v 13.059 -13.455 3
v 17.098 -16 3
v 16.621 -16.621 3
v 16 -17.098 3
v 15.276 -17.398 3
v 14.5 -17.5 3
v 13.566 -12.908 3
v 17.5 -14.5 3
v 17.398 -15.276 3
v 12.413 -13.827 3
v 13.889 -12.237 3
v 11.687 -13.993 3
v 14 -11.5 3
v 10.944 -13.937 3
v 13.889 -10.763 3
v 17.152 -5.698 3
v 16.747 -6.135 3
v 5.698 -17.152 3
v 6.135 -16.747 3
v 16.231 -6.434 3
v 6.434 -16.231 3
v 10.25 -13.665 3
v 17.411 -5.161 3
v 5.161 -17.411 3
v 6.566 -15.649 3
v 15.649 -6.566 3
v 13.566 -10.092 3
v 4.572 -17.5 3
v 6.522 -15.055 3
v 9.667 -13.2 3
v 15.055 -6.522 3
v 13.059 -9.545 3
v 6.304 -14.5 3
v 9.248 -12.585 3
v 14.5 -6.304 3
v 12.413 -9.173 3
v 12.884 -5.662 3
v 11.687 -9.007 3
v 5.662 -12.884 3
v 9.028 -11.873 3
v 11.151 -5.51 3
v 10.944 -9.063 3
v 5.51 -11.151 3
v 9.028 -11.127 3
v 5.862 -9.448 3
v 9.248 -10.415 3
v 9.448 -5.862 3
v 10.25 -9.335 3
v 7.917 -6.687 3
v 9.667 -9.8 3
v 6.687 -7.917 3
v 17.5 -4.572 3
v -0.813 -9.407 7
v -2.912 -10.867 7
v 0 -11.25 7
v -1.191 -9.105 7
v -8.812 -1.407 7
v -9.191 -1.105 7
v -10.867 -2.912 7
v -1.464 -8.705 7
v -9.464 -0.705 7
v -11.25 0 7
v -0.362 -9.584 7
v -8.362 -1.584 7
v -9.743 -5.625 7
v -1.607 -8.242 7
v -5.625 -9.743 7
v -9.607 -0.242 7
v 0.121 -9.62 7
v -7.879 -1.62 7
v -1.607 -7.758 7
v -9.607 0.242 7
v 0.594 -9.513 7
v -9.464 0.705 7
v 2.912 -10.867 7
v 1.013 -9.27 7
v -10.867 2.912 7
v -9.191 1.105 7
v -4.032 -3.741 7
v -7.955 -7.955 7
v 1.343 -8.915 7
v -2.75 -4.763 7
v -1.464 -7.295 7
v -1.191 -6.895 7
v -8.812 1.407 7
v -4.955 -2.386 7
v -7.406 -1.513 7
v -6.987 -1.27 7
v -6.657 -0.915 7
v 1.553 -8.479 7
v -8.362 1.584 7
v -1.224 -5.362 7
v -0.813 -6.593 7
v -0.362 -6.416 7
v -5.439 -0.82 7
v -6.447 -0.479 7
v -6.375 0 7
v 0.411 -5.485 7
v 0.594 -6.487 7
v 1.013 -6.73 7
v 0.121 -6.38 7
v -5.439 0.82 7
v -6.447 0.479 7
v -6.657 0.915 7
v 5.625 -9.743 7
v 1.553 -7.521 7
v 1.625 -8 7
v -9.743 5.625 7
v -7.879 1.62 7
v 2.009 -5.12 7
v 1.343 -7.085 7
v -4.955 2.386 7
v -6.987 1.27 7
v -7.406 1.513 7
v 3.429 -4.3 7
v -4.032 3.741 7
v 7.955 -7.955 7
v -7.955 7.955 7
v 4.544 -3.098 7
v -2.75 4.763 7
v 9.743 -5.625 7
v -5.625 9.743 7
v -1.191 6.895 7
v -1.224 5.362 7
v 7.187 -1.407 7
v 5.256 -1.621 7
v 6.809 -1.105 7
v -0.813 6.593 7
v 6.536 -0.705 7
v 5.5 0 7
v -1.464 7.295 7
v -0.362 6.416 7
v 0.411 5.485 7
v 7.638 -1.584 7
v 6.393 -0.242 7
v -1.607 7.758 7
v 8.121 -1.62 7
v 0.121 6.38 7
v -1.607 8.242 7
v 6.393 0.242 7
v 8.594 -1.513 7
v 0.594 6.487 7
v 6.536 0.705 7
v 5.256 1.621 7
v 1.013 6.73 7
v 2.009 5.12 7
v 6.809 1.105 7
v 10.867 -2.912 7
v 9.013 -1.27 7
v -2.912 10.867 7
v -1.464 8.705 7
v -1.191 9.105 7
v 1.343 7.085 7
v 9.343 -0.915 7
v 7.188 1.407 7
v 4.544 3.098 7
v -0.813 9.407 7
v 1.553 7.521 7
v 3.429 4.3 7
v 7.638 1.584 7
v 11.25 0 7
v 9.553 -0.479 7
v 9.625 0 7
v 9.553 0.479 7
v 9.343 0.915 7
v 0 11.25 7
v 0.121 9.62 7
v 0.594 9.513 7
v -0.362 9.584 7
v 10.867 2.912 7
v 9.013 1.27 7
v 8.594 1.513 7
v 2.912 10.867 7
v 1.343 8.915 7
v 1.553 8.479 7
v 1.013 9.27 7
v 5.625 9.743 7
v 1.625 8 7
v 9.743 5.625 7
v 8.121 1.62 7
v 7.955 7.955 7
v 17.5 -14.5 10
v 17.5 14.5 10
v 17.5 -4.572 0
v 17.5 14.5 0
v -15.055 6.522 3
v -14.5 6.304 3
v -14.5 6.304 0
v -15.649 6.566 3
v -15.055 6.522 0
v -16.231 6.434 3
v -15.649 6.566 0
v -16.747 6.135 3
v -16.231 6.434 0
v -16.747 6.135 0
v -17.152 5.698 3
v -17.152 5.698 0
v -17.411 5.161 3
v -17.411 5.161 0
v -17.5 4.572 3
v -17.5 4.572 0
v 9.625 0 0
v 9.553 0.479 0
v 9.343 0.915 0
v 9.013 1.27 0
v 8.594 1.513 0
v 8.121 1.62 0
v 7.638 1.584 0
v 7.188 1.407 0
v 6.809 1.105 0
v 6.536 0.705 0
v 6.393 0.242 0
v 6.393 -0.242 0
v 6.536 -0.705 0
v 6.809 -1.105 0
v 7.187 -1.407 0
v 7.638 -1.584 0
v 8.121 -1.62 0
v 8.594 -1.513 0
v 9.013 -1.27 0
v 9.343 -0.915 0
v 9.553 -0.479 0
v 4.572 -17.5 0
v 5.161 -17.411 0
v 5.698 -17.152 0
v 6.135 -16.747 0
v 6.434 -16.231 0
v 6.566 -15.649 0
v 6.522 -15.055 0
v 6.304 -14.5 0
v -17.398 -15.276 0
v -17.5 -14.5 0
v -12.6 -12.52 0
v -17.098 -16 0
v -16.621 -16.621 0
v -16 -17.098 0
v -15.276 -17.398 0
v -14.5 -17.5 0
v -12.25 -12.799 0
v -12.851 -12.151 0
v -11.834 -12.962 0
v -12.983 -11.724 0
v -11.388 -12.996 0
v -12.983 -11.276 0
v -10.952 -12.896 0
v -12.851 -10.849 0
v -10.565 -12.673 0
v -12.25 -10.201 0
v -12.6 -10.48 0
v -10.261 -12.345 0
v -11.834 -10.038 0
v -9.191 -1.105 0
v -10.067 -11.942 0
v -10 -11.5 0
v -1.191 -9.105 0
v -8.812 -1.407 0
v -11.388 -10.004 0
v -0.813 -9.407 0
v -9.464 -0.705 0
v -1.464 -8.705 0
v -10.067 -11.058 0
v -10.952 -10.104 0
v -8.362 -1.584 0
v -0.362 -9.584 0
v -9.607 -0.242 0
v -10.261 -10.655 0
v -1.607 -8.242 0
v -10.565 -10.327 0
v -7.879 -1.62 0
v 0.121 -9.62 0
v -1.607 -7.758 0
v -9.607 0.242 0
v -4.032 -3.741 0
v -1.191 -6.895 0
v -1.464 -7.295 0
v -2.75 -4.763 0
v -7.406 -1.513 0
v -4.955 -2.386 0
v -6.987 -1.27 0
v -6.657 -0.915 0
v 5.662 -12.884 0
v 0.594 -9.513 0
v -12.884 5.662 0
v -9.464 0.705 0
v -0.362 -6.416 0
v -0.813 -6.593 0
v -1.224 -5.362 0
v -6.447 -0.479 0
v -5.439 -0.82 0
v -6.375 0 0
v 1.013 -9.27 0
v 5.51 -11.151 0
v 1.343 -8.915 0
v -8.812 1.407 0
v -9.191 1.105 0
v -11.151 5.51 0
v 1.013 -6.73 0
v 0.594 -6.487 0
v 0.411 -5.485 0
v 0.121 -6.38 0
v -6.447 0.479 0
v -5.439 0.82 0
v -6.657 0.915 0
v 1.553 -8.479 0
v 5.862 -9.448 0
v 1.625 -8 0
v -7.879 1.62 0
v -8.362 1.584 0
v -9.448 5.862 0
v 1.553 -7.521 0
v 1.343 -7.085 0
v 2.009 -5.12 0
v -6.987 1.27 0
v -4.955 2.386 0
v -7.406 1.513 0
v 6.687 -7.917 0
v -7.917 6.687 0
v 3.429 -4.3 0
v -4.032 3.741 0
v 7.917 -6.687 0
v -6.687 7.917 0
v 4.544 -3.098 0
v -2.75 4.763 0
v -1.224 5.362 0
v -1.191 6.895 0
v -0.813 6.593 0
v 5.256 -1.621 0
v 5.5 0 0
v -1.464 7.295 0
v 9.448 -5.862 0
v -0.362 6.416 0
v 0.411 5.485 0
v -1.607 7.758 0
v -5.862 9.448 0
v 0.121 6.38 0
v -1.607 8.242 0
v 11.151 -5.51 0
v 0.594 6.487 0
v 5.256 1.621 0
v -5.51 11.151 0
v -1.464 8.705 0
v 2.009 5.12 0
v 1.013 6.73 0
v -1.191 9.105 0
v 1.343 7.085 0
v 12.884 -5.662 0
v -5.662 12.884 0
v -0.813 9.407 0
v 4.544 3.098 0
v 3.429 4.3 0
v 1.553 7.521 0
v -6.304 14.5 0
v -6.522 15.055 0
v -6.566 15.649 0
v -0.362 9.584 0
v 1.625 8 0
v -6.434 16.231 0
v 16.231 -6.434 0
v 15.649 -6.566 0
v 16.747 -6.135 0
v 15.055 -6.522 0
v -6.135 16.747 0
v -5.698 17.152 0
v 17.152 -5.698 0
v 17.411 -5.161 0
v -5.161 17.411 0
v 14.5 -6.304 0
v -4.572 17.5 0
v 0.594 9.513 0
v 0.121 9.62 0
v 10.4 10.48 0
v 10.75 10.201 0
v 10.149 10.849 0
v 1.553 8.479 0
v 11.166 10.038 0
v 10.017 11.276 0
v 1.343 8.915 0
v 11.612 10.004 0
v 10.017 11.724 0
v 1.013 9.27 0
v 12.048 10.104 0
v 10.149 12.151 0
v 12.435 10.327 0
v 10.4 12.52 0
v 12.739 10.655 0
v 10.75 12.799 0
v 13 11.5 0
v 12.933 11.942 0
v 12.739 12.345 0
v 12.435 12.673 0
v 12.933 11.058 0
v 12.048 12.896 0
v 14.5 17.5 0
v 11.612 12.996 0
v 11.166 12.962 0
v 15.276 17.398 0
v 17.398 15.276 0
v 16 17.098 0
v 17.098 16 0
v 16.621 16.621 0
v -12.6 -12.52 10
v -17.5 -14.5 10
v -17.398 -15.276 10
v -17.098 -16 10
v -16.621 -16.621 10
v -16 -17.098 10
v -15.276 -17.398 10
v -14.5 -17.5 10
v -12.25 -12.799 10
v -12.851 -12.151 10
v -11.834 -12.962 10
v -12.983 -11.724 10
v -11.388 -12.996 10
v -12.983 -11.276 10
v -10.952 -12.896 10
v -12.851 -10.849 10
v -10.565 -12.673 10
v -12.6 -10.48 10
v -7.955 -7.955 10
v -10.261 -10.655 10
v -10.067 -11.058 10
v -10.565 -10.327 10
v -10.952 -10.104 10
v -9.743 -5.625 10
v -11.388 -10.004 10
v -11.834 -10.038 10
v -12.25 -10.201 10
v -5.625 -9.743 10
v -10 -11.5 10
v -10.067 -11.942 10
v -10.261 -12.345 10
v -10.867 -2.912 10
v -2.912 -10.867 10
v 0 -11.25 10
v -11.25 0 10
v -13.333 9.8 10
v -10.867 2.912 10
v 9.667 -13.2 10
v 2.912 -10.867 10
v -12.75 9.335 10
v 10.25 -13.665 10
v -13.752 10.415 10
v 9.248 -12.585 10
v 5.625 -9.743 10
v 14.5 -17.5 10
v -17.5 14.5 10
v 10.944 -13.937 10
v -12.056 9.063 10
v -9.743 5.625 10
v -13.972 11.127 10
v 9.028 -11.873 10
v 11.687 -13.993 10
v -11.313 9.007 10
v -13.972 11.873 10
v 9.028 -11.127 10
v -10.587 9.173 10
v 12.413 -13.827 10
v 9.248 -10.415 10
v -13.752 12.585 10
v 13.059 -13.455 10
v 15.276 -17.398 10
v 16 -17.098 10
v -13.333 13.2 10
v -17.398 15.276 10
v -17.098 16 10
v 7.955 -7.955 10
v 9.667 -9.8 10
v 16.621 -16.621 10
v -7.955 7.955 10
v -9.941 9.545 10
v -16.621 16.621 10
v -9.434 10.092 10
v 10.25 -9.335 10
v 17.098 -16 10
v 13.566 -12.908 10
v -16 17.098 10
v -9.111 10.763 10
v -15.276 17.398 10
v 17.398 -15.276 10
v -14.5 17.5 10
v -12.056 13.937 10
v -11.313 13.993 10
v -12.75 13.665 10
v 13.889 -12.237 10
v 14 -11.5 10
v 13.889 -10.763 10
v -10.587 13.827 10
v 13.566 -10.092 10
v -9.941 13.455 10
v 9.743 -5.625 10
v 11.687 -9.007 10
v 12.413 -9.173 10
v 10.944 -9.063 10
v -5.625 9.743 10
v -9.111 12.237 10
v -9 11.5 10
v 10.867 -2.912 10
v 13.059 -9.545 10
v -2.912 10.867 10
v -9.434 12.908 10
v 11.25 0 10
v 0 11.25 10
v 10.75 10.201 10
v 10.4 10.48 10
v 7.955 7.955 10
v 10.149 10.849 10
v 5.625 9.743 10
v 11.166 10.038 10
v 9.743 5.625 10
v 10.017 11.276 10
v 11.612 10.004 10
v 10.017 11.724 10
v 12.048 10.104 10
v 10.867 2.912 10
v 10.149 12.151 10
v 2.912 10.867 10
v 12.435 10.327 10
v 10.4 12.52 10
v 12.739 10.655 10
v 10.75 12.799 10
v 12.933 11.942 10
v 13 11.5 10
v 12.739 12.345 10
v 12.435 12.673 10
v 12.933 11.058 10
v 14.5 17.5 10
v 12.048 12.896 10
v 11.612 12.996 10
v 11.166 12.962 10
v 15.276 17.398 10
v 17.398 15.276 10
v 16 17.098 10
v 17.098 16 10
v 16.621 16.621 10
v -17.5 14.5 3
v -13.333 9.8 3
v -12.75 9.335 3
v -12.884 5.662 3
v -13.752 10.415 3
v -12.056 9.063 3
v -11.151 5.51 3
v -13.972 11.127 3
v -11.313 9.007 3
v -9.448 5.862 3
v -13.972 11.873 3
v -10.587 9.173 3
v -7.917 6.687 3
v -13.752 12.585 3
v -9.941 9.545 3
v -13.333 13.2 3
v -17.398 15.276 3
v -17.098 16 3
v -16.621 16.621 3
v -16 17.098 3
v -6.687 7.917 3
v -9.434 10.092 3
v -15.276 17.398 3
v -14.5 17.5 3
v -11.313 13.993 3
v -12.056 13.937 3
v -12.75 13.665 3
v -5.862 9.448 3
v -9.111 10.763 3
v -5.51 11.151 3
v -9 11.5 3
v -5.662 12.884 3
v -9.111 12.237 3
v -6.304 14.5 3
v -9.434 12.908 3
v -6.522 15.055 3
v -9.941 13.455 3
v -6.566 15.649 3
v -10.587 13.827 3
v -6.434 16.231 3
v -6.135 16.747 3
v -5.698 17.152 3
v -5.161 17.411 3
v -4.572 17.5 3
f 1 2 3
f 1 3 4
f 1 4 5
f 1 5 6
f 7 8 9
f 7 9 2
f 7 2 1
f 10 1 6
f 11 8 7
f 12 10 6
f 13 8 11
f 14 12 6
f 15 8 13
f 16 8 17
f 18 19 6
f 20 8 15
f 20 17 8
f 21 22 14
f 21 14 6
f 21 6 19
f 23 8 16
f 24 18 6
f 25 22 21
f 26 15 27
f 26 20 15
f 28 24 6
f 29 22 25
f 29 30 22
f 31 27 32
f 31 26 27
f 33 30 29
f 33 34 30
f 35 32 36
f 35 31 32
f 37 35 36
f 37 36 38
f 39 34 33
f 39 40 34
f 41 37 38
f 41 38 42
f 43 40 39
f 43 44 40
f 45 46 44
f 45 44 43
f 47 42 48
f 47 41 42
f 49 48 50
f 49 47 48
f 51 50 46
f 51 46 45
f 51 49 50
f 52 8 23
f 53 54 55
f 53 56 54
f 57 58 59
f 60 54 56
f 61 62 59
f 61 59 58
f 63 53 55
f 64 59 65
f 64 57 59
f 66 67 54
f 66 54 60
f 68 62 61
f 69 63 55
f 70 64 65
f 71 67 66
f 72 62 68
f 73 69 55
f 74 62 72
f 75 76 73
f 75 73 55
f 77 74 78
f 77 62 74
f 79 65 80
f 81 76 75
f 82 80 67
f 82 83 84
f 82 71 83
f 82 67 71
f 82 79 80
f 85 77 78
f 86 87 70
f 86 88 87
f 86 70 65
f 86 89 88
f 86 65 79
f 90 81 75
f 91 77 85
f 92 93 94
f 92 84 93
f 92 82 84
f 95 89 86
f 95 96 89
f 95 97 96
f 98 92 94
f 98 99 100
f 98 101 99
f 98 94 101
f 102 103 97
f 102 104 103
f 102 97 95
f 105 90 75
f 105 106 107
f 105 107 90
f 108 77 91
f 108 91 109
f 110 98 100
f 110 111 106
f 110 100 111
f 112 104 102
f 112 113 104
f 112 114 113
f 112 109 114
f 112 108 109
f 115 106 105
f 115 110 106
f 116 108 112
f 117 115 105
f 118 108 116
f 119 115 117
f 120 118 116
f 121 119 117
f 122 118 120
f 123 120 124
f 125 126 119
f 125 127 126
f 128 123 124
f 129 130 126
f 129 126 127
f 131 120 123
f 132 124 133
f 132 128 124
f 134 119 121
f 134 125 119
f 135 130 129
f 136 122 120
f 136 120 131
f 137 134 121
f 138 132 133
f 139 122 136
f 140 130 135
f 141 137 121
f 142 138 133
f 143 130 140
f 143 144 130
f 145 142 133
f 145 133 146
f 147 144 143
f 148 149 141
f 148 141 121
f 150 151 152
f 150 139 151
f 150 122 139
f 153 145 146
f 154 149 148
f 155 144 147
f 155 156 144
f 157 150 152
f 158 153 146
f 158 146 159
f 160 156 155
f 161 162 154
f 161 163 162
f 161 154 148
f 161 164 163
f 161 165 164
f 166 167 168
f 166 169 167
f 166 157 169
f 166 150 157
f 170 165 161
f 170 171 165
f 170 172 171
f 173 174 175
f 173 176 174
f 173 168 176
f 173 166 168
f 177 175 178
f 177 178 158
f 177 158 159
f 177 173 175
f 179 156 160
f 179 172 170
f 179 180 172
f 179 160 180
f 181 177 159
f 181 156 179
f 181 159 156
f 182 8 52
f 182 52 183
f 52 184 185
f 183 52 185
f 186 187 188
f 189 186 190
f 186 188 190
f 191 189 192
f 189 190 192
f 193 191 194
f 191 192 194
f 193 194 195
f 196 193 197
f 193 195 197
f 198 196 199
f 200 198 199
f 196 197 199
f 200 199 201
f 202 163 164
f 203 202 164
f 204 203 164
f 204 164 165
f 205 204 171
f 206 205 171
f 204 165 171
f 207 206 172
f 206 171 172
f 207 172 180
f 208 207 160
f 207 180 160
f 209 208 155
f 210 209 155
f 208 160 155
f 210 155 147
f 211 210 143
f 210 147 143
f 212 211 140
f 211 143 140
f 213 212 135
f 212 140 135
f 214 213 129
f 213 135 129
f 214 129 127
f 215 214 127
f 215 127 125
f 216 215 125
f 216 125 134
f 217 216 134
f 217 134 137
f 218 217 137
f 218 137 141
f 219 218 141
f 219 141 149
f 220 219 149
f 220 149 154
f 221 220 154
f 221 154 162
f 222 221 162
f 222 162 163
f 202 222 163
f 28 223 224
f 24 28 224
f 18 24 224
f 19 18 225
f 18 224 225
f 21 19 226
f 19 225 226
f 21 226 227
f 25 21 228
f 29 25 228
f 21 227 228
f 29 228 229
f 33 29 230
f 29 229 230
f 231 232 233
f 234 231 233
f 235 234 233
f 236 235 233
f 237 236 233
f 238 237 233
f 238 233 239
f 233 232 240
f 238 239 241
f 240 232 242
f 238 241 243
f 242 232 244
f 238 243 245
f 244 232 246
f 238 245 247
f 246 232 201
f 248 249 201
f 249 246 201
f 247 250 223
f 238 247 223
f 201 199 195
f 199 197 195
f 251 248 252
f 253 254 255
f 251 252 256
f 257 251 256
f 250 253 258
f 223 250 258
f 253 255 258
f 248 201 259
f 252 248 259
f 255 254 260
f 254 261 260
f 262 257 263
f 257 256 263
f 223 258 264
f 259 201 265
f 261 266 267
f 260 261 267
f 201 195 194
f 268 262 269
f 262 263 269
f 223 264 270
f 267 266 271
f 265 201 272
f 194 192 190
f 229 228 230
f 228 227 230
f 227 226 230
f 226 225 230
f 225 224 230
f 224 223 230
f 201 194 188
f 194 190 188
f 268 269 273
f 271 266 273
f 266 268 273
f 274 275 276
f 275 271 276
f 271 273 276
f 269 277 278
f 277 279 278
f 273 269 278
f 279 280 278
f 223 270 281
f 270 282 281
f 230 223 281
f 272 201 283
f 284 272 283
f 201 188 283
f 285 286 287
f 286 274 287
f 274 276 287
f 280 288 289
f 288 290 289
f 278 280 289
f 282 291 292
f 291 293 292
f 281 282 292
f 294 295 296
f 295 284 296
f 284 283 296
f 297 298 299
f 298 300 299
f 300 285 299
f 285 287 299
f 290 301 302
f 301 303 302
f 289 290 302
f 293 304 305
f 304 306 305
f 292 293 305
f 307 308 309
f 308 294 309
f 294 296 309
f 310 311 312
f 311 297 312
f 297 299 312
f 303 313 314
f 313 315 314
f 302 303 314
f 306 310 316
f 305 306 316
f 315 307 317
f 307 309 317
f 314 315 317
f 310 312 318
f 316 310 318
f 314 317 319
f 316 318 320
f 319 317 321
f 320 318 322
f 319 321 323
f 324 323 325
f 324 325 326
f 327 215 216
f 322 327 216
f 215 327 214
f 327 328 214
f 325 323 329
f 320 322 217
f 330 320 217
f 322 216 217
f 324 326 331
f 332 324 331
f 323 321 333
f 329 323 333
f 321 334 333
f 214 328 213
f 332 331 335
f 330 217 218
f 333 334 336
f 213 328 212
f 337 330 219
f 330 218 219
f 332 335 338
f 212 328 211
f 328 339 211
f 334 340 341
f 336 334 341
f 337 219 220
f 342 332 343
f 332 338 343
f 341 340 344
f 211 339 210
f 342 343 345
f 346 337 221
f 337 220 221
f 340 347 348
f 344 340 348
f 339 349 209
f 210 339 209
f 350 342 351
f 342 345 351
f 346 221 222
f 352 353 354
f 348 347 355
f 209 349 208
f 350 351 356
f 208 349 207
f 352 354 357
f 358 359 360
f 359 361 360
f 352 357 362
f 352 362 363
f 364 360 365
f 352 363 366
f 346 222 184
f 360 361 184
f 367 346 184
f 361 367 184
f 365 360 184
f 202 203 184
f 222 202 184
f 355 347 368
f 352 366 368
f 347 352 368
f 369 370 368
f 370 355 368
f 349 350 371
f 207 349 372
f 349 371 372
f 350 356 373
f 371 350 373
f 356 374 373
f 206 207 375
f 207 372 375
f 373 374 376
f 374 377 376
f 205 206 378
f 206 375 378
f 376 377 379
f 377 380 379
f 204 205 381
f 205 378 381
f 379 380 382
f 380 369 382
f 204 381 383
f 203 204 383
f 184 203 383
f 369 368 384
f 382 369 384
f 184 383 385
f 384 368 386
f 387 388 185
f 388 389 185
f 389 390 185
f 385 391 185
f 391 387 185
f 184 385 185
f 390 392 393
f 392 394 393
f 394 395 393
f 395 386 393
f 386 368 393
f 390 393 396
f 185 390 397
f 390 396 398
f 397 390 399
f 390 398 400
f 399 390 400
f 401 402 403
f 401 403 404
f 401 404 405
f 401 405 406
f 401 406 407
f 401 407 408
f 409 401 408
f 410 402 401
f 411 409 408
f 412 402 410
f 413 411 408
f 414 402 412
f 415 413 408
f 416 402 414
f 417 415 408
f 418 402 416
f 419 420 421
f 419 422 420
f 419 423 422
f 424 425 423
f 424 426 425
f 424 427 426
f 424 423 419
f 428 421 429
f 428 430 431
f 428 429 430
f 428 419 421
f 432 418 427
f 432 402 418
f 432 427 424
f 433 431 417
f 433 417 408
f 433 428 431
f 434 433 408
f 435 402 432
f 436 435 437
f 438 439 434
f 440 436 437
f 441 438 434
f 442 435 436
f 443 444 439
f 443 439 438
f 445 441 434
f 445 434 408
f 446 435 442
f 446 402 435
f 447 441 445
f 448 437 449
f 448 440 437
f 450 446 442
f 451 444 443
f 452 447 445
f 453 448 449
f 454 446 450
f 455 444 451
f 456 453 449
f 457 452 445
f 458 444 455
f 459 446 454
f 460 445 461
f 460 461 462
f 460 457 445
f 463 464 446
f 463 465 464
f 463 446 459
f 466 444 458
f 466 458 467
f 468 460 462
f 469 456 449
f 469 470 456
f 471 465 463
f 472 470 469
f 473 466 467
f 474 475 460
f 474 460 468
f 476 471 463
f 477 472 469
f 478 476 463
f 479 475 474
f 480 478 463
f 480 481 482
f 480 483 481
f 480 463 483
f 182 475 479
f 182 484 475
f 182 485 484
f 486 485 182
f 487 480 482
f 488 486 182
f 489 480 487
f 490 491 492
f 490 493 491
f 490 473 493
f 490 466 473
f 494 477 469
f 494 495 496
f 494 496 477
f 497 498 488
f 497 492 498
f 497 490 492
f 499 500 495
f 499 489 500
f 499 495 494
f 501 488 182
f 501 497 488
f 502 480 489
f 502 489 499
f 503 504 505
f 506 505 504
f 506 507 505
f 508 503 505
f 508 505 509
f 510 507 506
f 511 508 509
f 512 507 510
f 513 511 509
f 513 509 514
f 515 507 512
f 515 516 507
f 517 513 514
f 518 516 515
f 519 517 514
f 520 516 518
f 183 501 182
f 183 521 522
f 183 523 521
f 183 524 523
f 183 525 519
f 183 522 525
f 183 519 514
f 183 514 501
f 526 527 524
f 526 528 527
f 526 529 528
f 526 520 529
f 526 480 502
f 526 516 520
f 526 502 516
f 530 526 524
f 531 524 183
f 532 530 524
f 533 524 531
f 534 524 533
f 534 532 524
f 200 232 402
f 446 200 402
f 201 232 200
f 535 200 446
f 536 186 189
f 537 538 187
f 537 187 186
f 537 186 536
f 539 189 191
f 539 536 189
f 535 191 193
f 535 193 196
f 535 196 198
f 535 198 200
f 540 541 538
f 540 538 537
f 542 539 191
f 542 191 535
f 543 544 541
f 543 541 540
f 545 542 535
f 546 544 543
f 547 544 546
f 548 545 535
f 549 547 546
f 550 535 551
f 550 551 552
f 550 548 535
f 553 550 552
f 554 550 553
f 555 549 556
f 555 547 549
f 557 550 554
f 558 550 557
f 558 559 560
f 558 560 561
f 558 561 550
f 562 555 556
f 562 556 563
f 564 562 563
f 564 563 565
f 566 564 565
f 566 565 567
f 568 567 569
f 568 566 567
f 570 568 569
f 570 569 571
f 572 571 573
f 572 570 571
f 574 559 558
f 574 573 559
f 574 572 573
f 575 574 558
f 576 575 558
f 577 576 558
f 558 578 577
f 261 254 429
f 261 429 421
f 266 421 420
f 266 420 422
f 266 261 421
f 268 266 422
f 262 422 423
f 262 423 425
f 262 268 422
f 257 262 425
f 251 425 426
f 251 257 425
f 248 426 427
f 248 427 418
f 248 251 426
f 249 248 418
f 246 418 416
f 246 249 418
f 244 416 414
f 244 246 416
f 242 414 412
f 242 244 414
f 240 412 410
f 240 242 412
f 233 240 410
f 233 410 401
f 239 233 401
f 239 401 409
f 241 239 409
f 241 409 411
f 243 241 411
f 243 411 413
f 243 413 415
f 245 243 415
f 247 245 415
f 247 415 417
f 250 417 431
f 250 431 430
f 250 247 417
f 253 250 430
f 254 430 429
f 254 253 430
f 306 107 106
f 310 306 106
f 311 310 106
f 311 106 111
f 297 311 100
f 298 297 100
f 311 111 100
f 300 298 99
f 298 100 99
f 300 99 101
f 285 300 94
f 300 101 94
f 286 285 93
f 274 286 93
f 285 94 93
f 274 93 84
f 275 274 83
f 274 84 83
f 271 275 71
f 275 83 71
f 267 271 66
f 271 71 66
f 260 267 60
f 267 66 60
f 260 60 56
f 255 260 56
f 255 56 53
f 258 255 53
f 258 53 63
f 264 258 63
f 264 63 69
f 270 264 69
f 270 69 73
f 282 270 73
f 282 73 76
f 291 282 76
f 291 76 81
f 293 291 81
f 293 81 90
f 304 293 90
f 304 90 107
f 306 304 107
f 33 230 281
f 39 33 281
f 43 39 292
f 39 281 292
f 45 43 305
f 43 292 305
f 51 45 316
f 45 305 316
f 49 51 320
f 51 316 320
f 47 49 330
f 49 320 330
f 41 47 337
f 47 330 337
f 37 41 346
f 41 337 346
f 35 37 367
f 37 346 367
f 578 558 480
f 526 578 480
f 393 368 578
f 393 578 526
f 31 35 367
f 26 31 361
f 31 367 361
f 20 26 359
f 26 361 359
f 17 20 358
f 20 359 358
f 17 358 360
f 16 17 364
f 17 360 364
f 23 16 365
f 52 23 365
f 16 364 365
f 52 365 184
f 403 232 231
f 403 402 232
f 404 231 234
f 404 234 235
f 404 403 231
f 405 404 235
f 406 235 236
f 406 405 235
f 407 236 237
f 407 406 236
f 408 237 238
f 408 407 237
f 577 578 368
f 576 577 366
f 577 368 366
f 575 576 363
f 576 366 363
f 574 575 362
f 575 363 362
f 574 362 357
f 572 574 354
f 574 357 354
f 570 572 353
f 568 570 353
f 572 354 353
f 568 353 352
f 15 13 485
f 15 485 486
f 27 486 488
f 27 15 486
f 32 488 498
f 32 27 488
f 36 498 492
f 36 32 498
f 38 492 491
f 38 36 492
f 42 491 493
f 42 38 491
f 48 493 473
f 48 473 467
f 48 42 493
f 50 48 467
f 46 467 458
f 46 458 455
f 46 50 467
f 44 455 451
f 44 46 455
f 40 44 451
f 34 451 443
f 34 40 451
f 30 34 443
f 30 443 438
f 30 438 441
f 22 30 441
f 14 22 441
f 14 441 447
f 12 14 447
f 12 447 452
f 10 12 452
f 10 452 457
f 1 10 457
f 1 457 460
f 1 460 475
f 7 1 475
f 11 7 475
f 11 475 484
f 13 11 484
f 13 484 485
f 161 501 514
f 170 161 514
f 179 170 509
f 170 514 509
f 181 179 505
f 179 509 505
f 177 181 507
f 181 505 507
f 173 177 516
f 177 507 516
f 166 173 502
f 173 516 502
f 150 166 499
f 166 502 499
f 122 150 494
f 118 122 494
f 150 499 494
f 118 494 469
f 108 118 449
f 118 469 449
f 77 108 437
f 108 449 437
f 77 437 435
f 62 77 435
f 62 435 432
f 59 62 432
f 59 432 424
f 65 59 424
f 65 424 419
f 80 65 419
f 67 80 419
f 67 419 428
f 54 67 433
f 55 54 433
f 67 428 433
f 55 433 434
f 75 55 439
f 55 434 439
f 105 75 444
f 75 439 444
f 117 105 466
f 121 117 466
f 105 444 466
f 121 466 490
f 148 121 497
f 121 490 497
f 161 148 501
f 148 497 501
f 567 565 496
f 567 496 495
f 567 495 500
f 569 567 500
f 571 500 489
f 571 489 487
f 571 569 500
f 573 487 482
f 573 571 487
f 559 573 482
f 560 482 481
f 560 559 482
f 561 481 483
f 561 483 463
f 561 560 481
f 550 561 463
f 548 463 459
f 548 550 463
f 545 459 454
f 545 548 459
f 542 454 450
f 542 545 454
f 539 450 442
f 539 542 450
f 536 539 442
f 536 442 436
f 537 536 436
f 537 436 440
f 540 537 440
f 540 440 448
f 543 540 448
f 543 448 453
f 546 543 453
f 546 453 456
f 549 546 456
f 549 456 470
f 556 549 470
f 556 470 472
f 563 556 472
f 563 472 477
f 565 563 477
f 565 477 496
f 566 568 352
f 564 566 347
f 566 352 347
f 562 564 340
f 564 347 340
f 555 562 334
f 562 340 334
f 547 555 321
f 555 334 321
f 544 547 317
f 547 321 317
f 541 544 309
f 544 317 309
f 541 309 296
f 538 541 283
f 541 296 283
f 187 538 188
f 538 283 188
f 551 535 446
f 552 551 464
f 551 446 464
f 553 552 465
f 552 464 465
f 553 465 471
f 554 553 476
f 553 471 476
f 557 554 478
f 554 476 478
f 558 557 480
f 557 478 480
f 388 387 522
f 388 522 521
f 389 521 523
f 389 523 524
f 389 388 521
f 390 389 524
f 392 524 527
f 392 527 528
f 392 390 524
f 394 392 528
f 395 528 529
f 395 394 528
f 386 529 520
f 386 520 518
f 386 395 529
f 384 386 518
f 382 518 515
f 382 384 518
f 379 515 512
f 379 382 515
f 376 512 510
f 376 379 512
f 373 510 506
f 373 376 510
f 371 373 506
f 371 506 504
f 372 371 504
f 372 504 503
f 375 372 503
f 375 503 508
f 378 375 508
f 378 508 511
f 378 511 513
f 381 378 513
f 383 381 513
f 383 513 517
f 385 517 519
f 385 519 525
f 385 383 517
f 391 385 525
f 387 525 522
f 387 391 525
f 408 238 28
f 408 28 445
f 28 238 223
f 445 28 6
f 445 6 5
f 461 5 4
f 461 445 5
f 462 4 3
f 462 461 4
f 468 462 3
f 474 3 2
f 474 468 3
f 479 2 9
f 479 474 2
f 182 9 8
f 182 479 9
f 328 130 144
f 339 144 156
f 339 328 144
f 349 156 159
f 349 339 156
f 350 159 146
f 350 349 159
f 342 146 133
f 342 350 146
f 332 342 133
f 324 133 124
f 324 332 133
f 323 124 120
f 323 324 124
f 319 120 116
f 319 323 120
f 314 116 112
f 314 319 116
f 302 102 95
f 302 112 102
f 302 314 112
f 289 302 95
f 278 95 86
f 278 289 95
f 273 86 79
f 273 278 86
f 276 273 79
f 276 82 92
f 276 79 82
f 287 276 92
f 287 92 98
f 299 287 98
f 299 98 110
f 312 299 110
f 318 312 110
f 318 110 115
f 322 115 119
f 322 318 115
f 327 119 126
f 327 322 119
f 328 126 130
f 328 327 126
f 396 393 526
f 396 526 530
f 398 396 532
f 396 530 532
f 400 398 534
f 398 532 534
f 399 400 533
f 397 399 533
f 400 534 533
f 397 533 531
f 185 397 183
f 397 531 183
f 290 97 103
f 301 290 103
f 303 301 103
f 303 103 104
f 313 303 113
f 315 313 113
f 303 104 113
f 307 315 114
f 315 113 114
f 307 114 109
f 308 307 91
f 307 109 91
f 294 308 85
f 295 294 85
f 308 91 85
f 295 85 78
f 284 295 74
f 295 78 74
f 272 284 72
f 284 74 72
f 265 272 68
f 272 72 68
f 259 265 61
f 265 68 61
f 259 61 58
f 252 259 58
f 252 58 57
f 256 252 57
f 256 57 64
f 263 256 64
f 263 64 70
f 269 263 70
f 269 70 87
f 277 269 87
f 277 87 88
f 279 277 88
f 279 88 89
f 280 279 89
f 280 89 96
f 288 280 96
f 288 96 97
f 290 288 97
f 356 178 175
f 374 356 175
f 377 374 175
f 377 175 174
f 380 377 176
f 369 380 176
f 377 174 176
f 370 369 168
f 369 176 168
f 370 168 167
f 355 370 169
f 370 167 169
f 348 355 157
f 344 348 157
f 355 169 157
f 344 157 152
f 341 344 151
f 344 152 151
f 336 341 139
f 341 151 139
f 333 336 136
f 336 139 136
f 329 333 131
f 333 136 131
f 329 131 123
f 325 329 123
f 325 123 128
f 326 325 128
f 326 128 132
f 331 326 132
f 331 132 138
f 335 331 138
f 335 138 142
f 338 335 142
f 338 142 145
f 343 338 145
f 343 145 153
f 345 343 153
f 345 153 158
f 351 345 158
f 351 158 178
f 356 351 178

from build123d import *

# Parameters (mm, degrees)
SKETCH1_W           = 35
SKETCH1_H           = 35
SKETCH1_R           = 5.5
SKETCH1_R_2         = 2.5
SKETCH1_R_3         = 1.5
BOSS_EXTRUDE1_DEPTH = 10
FILLET1_R           = 3
SKETCH2_R           = 1.625
CUT_EXTRUDE1_DEPTH  = 10
SKETCH3_R           = 11.25
CUT_EXTRUDE2_DEPTH  = 3
SKETCH5_R           = 2.5
CUT_EXTRUDE4_DEPTH  = 3
FILLET2_R           = 2


with BuildPart() as part:
    # Sketch1 → Boss-Extrude1 (new body)
    with BuildSketch(Plane.XY):
        Rectangle(SKETCH1_W, SKETCH1_H)
        Circle(SKETCH1_R, mode=Mode.SUBTRACT)
        with Locations((-11.5, 11.5)):
            Circle(SKETCH1_R_2, mode=Mode.SUBTRACT)
        with Locations((11.5, 11.5)):
            Circle(SKETCH1_R_3, mode=Mode.SUBTRACT)
        with Locations((11.5, -11.5)):
            Circle(SKETCH1_R_2, mode=Mode.SUBTRACT)
        with Locations((-11.5, -11.5)):
            Circle(SKETCH1_R_3, mode=Mode.SUBTRACT)
    extrude(amount=BOSS_EXTRUDE1_DEPTH)

    # Fillet1
    fillet1_edges = [part.edges().sort_by_distance(p)[0] for p in [
        (17.5, -17.5, 5),
        (-17.5, -17.5, 5),
        (-17.5, 17.5, 5),
        (17.5, 17.5, 5),
    ]]
    fillet(fillet1_edges, radius=FILLET1_R)

    # Sketch2 → Cut-Extrude1 (cut)
    with BuildSketch(Plane.XY.offset(10)):
        with Locations((-8, 0)):
            Circle(SKETCH2_R)
        with Locations((0, 8)):
            Circle(SKETCH2_R)
        with Locations((8, 0)):
            Circle(SKETCH2_R)
        with Locations((0, -8)):
            Circle(SKETCH2_R)
    extrude(amount=-CUT_EXTRUDE1_DEPTH, mode=Mode.SUBTRACT)

    # Sketch3 → Cut-Extrude2 (cut)
    with BuildSketch(Plane.XY.offset(10)):
        Circle(SKETCH3_R)
    extrude(amount=-CUT_EXTRUDE2_DEPTH, mode=Mode.SUBTRACT)

    # Sketch5 → Cut-Extrude4 (cut)
    # profile 1 of 2: a face of its own
    with BuildSketch(Plane(origin=(0, 0, 0), x_dir=(-1, 0, 0), z_dir=(0, 0, -1))):
        with BuildLine():
            Line((-15.742640687, -7.257359313), (-17.5, -9.014718626))
            Line((-17.5, -9.014718626), (-17.5, -14.5))
            ThreePointArc((-17.5, -14.5), (-16.621320344, -16.621320344), (-14.5, -17.5))
            Line((-14.5, -17.5), (-9.014718626, -17.5))
            Line((-9.014718626, -17.5), (-7.257359313, -15.742640687))
            ThreePointArc((-7.257359313, -15.742640687), (-7.257359313, -7.257359313), (-15.742640687, -7.257359313))
        make_face()
        with Locations((-11.5, -11.5)):
            Circle(SKETCH5_R, mode=Mode.SUBTRACT)
    # profile 2 of 2: a face of its own
    with BuildSketch(Plane(origin=(0, 0, 0), x_dir=(-1, 0, 0), z_dir=(0, 0, -1))):
        with BuildLine():
            Line((9.014718626, 17.5), (7.257359313, 15.742640687))
            ThreePointArc((7.257359313, 15.742640687), (7.257359313, 7.257359313), (15.742640687, 7.257359313))
            Line((15.742640687, 7.257359313), (17.5, 9.014718626))
            Line((17.5, 9.014718626), (17.5, 14.5))
            ThreePointArc((17.5, 14.5), (16.621320344, 16.621320344), (14.5, 17.5))
            Line((14.5, 17.5), (9.014718626, 17.5))
        make_face()
        with Locations((11.5, 11.5)):
            Circle(SKETCH5_R, mode=Mode.SUBTRACT)
    extrude(amount=-CUT_EXTRUDE4_DEPTH, mode=Mode.SUBTRACT)

    # Fillet2
    # the kernel refuses this fillet: 2 mm, written as the material it takes off along each edge
    with BuildSketch(Plane(origin=(-9.014718626, 17.5, -11.10730464), x_dir=(0.6704488170211711, -0.7419557828839344, 0), z_dir=(0, 0, 1))) as fillet2_piece_1:
        with BuildLine():
            CenterArc((4.462663268, 1.95555393), FILLET2_R, 137.89828583, 120)
            Line((2.978751702, 3.296451564), (2.830360546, 3.430541327))
            Line((2.830360546, 3.430541327), (-0.148391157, 0.134089763))
            Line((-0.148391157, 0.134089763), (0.010112612, -0.199744174))
            ThreePointArc((0.010112612, -0.199744174), (2.492214989, -0.074080742), (4.001438073, -0.195555393))
            Line((4.001438073, -0.195555393), (4.043367636, 0))
        make_face()
    extrude(amount=14.10730464, mode=Mode.SUBTRACT)
    with BuildSketch(Plane(origin=(-17.5, 9.014718626, -11.10730464), x_dir=(0, -1, 0), z_dir=(0, 0, 1)), Plane(origin=(17.5, -9.014718626, -11.10730464), x_dir=(0, 1, 0), z_dir=(0, 0, 1))) as fillet2_piece_2:
        with BuildLine():
            CenterArc((4.442921856, 2), FILLET2_R, 150, 120)
            Line((2.710871048, 3), (2.537665968, 3.1))
            ThreePointArc((2.537665968, 3.1), (1.615937957, 1.898780669), (-0.141421356, 0.141421356))
            Line((-0.141421356, 0.141421356), (0, -0.2))
            Line((0, -0.2), (4.442921856, -0.2))
            Line((4.442921856, -0.2), (4.442921856, 0))
        make_face()
    extrude(amount=14.10730464, mode=Mode.SUBTRACT)
    with BuildSketch(Plane(origin=(9.014718626, -17.5, -11.10730464), x_dir=(-1, 0, 0), z_dir=(0, 0, 1))) as fillet2_piece_3:
        with BuildLine():
            CenterArc((4.442921856, -2), FILLET2_R, 90, 120)
            Line((2.710871048, -3), (2.537665968, -3.1))
            ThreePointArc((2.537665968, -3.1), (1.615937957, -1.898780669), (-0.141421356, -0.141421356))
            Line((-0.141421356, -0.141421356), (0, 0.2))
            Line((0, 0.2), (4.442921856, 0.2))
            Line((4.442921856, 0.2), (4.442921856, 0))
        make_face()
    extrude(amount=14.10730464, mode=Mode.SUBTRACT)


solid = part.part
